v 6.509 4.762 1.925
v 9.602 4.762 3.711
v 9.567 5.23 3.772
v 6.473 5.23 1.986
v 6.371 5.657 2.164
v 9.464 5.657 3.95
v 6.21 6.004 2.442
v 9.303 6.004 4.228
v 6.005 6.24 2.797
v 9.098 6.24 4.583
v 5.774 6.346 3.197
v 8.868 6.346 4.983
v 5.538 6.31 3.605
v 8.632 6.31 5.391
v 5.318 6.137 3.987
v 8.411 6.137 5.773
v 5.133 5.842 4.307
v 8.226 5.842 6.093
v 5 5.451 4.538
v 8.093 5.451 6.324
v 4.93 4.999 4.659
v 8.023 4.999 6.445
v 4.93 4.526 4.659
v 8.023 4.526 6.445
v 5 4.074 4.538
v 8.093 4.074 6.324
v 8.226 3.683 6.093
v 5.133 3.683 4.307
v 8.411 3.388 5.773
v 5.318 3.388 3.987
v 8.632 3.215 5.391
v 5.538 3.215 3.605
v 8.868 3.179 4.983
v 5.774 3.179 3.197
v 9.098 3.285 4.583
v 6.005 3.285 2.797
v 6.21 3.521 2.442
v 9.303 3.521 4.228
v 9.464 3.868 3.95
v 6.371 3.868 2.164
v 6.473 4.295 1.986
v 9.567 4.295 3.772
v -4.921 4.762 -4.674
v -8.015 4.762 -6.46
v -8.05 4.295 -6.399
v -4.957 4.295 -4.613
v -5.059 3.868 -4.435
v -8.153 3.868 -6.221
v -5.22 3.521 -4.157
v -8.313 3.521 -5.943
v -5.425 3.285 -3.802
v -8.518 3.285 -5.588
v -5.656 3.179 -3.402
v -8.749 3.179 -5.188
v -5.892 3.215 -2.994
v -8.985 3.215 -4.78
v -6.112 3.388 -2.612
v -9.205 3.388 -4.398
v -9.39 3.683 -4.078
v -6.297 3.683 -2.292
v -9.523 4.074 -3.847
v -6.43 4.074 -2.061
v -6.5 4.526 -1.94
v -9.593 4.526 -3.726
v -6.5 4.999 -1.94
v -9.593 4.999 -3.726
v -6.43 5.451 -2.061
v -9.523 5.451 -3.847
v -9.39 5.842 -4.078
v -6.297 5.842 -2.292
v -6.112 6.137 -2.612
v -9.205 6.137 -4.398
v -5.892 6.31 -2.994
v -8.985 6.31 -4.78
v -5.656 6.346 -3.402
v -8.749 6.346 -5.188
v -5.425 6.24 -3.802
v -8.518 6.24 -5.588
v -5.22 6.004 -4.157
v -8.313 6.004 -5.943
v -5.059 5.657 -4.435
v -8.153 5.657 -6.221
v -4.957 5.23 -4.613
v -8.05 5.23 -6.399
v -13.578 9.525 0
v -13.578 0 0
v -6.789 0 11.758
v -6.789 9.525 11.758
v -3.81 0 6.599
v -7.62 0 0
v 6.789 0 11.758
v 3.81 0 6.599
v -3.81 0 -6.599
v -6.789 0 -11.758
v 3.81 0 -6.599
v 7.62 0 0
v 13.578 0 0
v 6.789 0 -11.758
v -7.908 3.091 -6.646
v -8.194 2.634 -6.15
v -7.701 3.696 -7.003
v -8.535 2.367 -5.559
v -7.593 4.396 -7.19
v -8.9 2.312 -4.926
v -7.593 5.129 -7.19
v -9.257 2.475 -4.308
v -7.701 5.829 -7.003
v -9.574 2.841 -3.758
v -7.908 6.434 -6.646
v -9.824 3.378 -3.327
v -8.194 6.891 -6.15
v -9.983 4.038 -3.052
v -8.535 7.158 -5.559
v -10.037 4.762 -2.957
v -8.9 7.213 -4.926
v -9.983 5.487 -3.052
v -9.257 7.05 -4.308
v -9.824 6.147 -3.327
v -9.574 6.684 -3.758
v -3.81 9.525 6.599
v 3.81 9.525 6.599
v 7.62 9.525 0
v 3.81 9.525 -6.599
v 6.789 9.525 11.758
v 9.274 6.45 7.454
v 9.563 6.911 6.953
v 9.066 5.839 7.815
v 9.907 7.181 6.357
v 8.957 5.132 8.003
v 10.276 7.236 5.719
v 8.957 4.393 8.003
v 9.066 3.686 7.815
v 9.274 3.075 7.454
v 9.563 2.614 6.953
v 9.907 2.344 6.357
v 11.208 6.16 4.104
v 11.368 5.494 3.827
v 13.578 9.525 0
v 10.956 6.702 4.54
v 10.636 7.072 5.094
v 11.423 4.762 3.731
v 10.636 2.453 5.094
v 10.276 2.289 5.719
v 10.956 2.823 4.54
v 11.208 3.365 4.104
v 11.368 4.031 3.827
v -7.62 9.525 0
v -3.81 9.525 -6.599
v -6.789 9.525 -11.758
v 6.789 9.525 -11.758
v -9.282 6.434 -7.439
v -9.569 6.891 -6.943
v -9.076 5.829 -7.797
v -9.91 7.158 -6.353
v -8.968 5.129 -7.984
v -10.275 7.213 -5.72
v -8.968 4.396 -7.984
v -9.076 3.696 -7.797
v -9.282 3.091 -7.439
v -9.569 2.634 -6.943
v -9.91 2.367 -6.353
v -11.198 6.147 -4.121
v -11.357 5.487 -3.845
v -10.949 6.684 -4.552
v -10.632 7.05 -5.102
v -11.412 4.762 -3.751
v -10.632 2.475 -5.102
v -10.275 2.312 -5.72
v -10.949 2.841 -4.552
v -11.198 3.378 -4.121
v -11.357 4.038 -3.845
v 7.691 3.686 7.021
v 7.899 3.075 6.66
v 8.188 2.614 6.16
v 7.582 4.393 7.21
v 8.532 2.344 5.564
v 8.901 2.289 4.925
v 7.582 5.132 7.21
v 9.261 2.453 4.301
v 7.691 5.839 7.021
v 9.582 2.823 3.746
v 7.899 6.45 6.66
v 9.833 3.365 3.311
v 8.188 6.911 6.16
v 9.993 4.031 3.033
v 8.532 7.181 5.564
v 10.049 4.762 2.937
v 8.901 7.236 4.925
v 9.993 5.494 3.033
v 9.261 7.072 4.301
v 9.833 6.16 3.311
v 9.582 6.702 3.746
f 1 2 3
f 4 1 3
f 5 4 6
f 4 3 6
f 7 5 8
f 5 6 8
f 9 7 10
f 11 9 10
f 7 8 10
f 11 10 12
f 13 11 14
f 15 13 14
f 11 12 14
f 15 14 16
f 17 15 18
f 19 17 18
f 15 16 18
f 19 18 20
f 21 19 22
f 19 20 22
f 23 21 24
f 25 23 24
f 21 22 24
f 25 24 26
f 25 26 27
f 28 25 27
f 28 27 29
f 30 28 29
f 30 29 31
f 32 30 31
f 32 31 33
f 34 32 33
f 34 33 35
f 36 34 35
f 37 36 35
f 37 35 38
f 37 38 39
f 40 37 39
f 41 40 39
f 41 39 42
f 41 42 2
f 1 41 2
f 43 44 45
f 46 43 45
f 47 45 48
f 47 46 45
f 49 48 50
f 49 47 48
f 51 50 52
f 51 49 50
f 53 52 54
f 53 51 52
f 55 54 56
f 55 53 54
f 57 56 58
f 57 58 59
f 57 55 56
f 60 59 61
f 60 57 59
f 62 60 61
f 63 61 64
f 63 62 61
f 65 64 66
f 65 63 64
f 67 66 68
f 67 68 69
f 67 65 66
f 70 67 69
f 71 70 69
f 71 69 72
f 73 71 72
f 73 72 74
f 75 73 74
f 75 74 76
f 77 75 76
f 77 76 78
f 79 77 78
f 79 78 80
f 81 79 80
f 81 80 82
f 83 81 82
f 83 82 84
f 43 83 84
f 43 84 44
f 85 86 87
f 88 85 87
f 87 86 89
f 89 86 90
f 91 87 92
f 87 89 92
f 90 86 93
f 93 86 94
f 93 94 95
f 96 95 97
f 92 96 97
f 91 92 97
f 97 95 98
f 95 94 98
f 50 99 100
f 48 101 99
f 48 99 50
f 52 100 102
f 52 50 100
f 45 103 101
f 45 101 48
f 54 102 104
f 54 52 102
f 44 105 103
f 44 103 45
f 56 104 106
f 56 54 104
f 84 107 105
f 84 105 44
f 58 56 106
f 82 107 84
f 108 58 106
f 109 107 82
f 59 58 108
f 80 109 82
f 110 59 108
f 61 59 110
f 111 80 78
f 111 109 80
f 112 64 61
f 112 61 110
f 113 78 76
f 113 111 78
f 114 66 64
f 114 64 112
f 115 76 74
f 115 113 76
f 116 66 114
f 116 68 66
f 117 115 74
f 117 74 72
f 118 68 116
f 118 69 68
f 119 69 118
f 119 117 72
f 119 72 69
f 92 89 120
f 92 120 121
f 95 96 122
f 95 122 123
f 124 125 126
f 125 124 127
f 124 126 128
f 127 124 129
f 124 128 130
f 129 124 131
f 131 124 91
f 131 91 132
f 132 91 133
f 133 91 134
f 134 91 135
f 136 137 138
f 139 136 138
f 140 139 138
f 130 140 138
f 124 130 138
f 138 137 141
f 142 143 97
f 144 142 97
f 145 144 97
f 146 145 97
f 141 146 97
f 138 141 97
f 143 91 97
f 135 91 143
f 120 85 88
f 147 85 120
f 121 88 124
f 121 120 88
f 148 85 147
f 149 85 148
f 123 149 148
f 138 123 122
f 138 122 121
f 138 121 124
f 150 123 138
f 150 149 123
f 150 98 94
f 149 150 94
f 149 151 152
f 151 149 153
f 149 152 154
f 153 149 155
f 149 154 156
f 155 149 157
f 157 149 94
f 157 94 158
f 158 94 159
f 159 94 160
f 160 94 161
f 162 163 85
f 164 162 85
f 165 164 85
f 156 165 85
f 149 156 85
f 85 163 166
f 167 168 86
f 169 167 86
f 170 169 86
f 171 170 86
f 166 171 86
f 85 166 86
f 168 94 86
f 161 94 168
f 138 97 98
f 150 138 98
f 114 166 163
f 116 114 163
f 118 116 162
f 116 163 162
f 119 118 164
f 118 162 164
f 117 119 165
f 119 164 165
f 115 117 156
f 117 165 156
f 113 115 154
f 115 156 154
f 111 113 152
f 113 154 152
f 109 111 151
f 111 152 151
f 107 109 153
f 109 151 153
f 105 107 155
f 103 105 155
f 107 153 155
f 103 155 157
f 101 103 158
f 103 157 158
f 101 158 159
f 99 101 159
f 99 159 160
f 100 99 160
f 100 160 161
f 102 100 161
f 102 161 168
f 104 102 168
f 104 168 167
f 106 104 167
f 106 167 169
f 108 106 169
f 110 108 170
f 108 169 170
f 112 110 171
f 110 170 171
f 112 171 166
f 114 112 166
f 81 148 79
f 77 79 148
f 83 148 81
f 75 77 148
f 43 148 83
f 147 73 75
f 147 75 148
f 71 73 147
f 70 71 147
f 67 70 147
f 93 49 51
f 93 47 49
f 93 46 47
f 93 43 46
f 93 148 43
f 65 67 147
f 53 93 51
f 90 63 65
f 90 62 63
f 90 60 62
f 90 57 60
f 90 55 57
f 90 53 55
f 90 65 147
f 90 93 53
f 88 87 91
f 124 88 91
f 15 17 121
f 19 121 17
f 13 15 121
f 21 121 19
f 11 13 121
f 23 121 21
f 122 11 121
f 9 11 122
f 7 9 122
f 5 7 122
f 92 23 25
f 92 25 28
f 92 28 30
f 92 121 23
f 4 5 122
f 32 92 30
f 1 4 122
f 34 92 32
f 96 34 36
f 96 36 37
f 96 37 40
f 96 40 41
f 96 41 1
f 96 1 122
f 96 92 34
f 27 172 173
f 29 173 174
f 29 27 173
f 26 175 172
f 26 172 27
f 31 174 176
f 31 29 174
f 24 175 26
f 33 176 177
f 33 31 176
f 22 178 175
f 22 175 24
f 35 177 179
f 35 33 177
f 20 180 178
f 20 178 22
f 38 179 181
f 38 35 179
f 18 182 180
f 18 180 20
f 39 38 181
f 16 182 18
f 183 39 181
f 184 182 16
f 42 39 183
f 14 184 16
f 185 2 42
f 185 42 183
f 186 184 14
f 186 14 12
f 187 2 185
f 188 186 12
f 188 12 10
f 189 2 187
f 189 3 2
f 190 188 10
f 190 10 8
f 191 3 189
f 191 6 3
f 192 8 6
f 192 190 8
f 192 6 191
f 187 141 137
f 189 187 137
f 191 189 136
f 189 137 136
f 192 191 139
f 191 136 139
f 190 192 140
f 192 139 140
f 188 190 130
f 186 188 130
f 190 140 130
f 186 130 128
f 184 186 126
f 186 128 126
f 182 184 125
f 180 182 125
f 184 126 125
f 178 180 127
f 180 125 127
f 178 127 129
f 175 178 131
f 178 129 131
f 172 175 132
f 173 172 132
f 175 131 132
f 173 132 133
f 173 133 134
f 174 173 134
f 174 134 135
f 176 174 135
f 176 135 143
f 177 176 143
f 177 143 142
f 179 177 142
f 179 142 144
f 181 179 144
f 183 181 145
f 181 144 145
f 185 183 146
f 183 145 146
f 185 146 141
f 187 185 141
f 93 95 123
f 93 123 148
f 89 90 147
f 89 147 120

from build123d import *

# Parameters (mm, degrees)
BOSS_EXTRUDE1_DEPTH = 9.525
SKETCH2_R           = 2.48046875
CUT_EXTRUDE1_DEPTH  = 1.5875
SKETCH3_R           = 1.5875
CUT_EXTRUDE2_DEPTH  = 6.35
SKETCH4_R           = 2.45760875
CUT_EXTRUDE3_DEPTH  = 1.5875
CUT_EXTRUDE4_START  = -6.35
SKETCH5_R           = 1.5875
CUT_EXTRUDE4_DEPTH  = 6.35


with BuildPart() as part:
    # Sketch1 → Boss-Extrude1 (new body)
    with BuildSketch(Plane(origin=(0, 0, 0), x_dir=(1, 0, 0), z_dir=(0, 1, 0))):
        Polygon((13.57753309, 0), (6.788766545, 11.758488577), (-6.788766545, 11.758488577), (-13.57753309, 0), (-6.788766545, -11.758488577), (6.788766545, -11.758488577), align=None)
        Polygon((7.62, 0), (3.81, 6.599113577), (-3.81, 6.599113577), (-7.62, 0), (-3.81, -6.599113577), (3.81, -6.599113577), align=None, mode=Mode.SUBTRACT)
    extrude(amount=BOSS_EXTRUDE1_DEPTH)

    # Sketch2 → Cut-Extrude1 (cut)
    with BuildSketch(Plane(origin=(10.183149818, 0, 5.879244288), x_dir=(0.4999999999999997, 0, -0.8660254037844389), z_dir=(0.8660254037844389, 0, 0.4999999999999997))):
        with Locations((0, 4.7625)):
            Circle(SKETCH2_R)
    extrude(amount=-CUT_EXTRUDE1_DEPTH, mode=Mode.SUBTRACT)

    # Sketch3 → Cut-Extrude2 (cut)
    with BuildSketch(Plane(origin=(8.808334489, 0, 5.085494288), x_dir=(0.49999999999999983, 0, -0.8660254037844388), z_dir=(0.8660254037844387, 0, 0.4999999999999998))):
        with Locations((0, 4.7625)):
            Circle(SKETCH3_R)
    extrude(amount=-CUT_EXTRUDE2_DEPTH, mode=Mode.SUBTRACT)

    # Sketch4 → Cut-Extrude3 (cut)
    with BuildSketch(Plane(origin=(-10.183149818, 0, -5.879244288), x_dir=(-0.4999999999999997, 0, 0.8660254037844389), z_dir=(-0.8660254037844389, 0, -0.4999999999999997))):
        with Locations((0, 4.7625)):
            Circle(SKETCH4_R)
    extrude(amount=-CUT_EXTRUDE3_DEPTH, mode=Mode.SUBTRACT)

    # Sketch5 → Cut-Extrude4 (cut)
    with BuildSketch(Plane(origin=(-8.808334489, 0, -5.085494288), x_dir=(-0.49999999999999983, 0, 0.8660254037844388), z_dir=(-0.8660254037844387, 0, -0.4999999999999998)).offset(CUT_EXTRUDE4_START)):
        with Locations(Location((0, 4.7625, 0), (0, 0, 180))):
            Circle(SKETCH5_R)
    extrude(amount=CUT_EXTRUDE4_DEPTH, mode=Mode.SUBTRACT)


solid = part.part
